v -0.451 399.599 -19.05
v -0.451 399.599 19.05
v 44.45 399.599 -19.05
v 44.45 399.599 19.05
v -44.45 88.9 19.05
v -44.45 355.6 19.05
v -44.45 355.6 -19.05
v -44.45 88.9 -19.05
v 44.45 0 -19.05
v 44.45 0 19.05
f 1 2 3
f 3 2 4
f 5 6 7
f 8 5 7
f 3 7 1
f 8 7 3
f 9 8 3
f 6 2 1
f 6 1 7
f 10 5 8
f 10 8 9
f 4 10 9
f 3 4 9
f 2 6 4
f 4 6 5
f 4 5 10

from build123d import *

# Parameters (mm, degrees)
SKETCH1_W           = 88.9
SKETCH1_H           = 38.1
BOSS_EXTRUDE1_DEPTH = 444.5
CUT_EXTRUDE1_DEPTH  = 449.338780946
CUT_EXTRUDE2_DEPTH  = 449.338780946


with BuildPart() as part:
    # Sketch1 → Boss-Extrude1 (new body)
    with BuildSketch(Plane(origin=(0, 0, 0), x_dir=(1, 0, 0), z_dir=(0, 1, 0))):
        Rectangle(SKETCH1_W, SKETCH1_H)
    extrude(amount=BOSS_EXTRUDE1_DEPTH)

    # Sketch2 → Cut-Extrude1 (cut, through all)
    with BuildSketch(Plane.XY.offset(19.05)):
        Polygon((-44.45, 444.5), (44.45, 444.5), (-44.45, 355.6), align=None)
        Polygon((44.45, 0), (-44.45, 0), (-44.45, 88.9), align=None)
    extrude(amount=-CUT_EXTRUDE1_DEPTH, mode=Mode.SUBTRACT)

    # Sketch3 → Cut-Extrude2 (cut, through all)
    with BuildSketch(Plane.XY.offset(19.05)):
        Polygon((44.45, 444.5), (-0.451280605, 399.598719395), (44.45, 399.598719395), align=None)
    extrude(amount=-CUT_EXTRUDE2_DEPTH, mode=Mode.SUBTRACT)


solid = part.part
